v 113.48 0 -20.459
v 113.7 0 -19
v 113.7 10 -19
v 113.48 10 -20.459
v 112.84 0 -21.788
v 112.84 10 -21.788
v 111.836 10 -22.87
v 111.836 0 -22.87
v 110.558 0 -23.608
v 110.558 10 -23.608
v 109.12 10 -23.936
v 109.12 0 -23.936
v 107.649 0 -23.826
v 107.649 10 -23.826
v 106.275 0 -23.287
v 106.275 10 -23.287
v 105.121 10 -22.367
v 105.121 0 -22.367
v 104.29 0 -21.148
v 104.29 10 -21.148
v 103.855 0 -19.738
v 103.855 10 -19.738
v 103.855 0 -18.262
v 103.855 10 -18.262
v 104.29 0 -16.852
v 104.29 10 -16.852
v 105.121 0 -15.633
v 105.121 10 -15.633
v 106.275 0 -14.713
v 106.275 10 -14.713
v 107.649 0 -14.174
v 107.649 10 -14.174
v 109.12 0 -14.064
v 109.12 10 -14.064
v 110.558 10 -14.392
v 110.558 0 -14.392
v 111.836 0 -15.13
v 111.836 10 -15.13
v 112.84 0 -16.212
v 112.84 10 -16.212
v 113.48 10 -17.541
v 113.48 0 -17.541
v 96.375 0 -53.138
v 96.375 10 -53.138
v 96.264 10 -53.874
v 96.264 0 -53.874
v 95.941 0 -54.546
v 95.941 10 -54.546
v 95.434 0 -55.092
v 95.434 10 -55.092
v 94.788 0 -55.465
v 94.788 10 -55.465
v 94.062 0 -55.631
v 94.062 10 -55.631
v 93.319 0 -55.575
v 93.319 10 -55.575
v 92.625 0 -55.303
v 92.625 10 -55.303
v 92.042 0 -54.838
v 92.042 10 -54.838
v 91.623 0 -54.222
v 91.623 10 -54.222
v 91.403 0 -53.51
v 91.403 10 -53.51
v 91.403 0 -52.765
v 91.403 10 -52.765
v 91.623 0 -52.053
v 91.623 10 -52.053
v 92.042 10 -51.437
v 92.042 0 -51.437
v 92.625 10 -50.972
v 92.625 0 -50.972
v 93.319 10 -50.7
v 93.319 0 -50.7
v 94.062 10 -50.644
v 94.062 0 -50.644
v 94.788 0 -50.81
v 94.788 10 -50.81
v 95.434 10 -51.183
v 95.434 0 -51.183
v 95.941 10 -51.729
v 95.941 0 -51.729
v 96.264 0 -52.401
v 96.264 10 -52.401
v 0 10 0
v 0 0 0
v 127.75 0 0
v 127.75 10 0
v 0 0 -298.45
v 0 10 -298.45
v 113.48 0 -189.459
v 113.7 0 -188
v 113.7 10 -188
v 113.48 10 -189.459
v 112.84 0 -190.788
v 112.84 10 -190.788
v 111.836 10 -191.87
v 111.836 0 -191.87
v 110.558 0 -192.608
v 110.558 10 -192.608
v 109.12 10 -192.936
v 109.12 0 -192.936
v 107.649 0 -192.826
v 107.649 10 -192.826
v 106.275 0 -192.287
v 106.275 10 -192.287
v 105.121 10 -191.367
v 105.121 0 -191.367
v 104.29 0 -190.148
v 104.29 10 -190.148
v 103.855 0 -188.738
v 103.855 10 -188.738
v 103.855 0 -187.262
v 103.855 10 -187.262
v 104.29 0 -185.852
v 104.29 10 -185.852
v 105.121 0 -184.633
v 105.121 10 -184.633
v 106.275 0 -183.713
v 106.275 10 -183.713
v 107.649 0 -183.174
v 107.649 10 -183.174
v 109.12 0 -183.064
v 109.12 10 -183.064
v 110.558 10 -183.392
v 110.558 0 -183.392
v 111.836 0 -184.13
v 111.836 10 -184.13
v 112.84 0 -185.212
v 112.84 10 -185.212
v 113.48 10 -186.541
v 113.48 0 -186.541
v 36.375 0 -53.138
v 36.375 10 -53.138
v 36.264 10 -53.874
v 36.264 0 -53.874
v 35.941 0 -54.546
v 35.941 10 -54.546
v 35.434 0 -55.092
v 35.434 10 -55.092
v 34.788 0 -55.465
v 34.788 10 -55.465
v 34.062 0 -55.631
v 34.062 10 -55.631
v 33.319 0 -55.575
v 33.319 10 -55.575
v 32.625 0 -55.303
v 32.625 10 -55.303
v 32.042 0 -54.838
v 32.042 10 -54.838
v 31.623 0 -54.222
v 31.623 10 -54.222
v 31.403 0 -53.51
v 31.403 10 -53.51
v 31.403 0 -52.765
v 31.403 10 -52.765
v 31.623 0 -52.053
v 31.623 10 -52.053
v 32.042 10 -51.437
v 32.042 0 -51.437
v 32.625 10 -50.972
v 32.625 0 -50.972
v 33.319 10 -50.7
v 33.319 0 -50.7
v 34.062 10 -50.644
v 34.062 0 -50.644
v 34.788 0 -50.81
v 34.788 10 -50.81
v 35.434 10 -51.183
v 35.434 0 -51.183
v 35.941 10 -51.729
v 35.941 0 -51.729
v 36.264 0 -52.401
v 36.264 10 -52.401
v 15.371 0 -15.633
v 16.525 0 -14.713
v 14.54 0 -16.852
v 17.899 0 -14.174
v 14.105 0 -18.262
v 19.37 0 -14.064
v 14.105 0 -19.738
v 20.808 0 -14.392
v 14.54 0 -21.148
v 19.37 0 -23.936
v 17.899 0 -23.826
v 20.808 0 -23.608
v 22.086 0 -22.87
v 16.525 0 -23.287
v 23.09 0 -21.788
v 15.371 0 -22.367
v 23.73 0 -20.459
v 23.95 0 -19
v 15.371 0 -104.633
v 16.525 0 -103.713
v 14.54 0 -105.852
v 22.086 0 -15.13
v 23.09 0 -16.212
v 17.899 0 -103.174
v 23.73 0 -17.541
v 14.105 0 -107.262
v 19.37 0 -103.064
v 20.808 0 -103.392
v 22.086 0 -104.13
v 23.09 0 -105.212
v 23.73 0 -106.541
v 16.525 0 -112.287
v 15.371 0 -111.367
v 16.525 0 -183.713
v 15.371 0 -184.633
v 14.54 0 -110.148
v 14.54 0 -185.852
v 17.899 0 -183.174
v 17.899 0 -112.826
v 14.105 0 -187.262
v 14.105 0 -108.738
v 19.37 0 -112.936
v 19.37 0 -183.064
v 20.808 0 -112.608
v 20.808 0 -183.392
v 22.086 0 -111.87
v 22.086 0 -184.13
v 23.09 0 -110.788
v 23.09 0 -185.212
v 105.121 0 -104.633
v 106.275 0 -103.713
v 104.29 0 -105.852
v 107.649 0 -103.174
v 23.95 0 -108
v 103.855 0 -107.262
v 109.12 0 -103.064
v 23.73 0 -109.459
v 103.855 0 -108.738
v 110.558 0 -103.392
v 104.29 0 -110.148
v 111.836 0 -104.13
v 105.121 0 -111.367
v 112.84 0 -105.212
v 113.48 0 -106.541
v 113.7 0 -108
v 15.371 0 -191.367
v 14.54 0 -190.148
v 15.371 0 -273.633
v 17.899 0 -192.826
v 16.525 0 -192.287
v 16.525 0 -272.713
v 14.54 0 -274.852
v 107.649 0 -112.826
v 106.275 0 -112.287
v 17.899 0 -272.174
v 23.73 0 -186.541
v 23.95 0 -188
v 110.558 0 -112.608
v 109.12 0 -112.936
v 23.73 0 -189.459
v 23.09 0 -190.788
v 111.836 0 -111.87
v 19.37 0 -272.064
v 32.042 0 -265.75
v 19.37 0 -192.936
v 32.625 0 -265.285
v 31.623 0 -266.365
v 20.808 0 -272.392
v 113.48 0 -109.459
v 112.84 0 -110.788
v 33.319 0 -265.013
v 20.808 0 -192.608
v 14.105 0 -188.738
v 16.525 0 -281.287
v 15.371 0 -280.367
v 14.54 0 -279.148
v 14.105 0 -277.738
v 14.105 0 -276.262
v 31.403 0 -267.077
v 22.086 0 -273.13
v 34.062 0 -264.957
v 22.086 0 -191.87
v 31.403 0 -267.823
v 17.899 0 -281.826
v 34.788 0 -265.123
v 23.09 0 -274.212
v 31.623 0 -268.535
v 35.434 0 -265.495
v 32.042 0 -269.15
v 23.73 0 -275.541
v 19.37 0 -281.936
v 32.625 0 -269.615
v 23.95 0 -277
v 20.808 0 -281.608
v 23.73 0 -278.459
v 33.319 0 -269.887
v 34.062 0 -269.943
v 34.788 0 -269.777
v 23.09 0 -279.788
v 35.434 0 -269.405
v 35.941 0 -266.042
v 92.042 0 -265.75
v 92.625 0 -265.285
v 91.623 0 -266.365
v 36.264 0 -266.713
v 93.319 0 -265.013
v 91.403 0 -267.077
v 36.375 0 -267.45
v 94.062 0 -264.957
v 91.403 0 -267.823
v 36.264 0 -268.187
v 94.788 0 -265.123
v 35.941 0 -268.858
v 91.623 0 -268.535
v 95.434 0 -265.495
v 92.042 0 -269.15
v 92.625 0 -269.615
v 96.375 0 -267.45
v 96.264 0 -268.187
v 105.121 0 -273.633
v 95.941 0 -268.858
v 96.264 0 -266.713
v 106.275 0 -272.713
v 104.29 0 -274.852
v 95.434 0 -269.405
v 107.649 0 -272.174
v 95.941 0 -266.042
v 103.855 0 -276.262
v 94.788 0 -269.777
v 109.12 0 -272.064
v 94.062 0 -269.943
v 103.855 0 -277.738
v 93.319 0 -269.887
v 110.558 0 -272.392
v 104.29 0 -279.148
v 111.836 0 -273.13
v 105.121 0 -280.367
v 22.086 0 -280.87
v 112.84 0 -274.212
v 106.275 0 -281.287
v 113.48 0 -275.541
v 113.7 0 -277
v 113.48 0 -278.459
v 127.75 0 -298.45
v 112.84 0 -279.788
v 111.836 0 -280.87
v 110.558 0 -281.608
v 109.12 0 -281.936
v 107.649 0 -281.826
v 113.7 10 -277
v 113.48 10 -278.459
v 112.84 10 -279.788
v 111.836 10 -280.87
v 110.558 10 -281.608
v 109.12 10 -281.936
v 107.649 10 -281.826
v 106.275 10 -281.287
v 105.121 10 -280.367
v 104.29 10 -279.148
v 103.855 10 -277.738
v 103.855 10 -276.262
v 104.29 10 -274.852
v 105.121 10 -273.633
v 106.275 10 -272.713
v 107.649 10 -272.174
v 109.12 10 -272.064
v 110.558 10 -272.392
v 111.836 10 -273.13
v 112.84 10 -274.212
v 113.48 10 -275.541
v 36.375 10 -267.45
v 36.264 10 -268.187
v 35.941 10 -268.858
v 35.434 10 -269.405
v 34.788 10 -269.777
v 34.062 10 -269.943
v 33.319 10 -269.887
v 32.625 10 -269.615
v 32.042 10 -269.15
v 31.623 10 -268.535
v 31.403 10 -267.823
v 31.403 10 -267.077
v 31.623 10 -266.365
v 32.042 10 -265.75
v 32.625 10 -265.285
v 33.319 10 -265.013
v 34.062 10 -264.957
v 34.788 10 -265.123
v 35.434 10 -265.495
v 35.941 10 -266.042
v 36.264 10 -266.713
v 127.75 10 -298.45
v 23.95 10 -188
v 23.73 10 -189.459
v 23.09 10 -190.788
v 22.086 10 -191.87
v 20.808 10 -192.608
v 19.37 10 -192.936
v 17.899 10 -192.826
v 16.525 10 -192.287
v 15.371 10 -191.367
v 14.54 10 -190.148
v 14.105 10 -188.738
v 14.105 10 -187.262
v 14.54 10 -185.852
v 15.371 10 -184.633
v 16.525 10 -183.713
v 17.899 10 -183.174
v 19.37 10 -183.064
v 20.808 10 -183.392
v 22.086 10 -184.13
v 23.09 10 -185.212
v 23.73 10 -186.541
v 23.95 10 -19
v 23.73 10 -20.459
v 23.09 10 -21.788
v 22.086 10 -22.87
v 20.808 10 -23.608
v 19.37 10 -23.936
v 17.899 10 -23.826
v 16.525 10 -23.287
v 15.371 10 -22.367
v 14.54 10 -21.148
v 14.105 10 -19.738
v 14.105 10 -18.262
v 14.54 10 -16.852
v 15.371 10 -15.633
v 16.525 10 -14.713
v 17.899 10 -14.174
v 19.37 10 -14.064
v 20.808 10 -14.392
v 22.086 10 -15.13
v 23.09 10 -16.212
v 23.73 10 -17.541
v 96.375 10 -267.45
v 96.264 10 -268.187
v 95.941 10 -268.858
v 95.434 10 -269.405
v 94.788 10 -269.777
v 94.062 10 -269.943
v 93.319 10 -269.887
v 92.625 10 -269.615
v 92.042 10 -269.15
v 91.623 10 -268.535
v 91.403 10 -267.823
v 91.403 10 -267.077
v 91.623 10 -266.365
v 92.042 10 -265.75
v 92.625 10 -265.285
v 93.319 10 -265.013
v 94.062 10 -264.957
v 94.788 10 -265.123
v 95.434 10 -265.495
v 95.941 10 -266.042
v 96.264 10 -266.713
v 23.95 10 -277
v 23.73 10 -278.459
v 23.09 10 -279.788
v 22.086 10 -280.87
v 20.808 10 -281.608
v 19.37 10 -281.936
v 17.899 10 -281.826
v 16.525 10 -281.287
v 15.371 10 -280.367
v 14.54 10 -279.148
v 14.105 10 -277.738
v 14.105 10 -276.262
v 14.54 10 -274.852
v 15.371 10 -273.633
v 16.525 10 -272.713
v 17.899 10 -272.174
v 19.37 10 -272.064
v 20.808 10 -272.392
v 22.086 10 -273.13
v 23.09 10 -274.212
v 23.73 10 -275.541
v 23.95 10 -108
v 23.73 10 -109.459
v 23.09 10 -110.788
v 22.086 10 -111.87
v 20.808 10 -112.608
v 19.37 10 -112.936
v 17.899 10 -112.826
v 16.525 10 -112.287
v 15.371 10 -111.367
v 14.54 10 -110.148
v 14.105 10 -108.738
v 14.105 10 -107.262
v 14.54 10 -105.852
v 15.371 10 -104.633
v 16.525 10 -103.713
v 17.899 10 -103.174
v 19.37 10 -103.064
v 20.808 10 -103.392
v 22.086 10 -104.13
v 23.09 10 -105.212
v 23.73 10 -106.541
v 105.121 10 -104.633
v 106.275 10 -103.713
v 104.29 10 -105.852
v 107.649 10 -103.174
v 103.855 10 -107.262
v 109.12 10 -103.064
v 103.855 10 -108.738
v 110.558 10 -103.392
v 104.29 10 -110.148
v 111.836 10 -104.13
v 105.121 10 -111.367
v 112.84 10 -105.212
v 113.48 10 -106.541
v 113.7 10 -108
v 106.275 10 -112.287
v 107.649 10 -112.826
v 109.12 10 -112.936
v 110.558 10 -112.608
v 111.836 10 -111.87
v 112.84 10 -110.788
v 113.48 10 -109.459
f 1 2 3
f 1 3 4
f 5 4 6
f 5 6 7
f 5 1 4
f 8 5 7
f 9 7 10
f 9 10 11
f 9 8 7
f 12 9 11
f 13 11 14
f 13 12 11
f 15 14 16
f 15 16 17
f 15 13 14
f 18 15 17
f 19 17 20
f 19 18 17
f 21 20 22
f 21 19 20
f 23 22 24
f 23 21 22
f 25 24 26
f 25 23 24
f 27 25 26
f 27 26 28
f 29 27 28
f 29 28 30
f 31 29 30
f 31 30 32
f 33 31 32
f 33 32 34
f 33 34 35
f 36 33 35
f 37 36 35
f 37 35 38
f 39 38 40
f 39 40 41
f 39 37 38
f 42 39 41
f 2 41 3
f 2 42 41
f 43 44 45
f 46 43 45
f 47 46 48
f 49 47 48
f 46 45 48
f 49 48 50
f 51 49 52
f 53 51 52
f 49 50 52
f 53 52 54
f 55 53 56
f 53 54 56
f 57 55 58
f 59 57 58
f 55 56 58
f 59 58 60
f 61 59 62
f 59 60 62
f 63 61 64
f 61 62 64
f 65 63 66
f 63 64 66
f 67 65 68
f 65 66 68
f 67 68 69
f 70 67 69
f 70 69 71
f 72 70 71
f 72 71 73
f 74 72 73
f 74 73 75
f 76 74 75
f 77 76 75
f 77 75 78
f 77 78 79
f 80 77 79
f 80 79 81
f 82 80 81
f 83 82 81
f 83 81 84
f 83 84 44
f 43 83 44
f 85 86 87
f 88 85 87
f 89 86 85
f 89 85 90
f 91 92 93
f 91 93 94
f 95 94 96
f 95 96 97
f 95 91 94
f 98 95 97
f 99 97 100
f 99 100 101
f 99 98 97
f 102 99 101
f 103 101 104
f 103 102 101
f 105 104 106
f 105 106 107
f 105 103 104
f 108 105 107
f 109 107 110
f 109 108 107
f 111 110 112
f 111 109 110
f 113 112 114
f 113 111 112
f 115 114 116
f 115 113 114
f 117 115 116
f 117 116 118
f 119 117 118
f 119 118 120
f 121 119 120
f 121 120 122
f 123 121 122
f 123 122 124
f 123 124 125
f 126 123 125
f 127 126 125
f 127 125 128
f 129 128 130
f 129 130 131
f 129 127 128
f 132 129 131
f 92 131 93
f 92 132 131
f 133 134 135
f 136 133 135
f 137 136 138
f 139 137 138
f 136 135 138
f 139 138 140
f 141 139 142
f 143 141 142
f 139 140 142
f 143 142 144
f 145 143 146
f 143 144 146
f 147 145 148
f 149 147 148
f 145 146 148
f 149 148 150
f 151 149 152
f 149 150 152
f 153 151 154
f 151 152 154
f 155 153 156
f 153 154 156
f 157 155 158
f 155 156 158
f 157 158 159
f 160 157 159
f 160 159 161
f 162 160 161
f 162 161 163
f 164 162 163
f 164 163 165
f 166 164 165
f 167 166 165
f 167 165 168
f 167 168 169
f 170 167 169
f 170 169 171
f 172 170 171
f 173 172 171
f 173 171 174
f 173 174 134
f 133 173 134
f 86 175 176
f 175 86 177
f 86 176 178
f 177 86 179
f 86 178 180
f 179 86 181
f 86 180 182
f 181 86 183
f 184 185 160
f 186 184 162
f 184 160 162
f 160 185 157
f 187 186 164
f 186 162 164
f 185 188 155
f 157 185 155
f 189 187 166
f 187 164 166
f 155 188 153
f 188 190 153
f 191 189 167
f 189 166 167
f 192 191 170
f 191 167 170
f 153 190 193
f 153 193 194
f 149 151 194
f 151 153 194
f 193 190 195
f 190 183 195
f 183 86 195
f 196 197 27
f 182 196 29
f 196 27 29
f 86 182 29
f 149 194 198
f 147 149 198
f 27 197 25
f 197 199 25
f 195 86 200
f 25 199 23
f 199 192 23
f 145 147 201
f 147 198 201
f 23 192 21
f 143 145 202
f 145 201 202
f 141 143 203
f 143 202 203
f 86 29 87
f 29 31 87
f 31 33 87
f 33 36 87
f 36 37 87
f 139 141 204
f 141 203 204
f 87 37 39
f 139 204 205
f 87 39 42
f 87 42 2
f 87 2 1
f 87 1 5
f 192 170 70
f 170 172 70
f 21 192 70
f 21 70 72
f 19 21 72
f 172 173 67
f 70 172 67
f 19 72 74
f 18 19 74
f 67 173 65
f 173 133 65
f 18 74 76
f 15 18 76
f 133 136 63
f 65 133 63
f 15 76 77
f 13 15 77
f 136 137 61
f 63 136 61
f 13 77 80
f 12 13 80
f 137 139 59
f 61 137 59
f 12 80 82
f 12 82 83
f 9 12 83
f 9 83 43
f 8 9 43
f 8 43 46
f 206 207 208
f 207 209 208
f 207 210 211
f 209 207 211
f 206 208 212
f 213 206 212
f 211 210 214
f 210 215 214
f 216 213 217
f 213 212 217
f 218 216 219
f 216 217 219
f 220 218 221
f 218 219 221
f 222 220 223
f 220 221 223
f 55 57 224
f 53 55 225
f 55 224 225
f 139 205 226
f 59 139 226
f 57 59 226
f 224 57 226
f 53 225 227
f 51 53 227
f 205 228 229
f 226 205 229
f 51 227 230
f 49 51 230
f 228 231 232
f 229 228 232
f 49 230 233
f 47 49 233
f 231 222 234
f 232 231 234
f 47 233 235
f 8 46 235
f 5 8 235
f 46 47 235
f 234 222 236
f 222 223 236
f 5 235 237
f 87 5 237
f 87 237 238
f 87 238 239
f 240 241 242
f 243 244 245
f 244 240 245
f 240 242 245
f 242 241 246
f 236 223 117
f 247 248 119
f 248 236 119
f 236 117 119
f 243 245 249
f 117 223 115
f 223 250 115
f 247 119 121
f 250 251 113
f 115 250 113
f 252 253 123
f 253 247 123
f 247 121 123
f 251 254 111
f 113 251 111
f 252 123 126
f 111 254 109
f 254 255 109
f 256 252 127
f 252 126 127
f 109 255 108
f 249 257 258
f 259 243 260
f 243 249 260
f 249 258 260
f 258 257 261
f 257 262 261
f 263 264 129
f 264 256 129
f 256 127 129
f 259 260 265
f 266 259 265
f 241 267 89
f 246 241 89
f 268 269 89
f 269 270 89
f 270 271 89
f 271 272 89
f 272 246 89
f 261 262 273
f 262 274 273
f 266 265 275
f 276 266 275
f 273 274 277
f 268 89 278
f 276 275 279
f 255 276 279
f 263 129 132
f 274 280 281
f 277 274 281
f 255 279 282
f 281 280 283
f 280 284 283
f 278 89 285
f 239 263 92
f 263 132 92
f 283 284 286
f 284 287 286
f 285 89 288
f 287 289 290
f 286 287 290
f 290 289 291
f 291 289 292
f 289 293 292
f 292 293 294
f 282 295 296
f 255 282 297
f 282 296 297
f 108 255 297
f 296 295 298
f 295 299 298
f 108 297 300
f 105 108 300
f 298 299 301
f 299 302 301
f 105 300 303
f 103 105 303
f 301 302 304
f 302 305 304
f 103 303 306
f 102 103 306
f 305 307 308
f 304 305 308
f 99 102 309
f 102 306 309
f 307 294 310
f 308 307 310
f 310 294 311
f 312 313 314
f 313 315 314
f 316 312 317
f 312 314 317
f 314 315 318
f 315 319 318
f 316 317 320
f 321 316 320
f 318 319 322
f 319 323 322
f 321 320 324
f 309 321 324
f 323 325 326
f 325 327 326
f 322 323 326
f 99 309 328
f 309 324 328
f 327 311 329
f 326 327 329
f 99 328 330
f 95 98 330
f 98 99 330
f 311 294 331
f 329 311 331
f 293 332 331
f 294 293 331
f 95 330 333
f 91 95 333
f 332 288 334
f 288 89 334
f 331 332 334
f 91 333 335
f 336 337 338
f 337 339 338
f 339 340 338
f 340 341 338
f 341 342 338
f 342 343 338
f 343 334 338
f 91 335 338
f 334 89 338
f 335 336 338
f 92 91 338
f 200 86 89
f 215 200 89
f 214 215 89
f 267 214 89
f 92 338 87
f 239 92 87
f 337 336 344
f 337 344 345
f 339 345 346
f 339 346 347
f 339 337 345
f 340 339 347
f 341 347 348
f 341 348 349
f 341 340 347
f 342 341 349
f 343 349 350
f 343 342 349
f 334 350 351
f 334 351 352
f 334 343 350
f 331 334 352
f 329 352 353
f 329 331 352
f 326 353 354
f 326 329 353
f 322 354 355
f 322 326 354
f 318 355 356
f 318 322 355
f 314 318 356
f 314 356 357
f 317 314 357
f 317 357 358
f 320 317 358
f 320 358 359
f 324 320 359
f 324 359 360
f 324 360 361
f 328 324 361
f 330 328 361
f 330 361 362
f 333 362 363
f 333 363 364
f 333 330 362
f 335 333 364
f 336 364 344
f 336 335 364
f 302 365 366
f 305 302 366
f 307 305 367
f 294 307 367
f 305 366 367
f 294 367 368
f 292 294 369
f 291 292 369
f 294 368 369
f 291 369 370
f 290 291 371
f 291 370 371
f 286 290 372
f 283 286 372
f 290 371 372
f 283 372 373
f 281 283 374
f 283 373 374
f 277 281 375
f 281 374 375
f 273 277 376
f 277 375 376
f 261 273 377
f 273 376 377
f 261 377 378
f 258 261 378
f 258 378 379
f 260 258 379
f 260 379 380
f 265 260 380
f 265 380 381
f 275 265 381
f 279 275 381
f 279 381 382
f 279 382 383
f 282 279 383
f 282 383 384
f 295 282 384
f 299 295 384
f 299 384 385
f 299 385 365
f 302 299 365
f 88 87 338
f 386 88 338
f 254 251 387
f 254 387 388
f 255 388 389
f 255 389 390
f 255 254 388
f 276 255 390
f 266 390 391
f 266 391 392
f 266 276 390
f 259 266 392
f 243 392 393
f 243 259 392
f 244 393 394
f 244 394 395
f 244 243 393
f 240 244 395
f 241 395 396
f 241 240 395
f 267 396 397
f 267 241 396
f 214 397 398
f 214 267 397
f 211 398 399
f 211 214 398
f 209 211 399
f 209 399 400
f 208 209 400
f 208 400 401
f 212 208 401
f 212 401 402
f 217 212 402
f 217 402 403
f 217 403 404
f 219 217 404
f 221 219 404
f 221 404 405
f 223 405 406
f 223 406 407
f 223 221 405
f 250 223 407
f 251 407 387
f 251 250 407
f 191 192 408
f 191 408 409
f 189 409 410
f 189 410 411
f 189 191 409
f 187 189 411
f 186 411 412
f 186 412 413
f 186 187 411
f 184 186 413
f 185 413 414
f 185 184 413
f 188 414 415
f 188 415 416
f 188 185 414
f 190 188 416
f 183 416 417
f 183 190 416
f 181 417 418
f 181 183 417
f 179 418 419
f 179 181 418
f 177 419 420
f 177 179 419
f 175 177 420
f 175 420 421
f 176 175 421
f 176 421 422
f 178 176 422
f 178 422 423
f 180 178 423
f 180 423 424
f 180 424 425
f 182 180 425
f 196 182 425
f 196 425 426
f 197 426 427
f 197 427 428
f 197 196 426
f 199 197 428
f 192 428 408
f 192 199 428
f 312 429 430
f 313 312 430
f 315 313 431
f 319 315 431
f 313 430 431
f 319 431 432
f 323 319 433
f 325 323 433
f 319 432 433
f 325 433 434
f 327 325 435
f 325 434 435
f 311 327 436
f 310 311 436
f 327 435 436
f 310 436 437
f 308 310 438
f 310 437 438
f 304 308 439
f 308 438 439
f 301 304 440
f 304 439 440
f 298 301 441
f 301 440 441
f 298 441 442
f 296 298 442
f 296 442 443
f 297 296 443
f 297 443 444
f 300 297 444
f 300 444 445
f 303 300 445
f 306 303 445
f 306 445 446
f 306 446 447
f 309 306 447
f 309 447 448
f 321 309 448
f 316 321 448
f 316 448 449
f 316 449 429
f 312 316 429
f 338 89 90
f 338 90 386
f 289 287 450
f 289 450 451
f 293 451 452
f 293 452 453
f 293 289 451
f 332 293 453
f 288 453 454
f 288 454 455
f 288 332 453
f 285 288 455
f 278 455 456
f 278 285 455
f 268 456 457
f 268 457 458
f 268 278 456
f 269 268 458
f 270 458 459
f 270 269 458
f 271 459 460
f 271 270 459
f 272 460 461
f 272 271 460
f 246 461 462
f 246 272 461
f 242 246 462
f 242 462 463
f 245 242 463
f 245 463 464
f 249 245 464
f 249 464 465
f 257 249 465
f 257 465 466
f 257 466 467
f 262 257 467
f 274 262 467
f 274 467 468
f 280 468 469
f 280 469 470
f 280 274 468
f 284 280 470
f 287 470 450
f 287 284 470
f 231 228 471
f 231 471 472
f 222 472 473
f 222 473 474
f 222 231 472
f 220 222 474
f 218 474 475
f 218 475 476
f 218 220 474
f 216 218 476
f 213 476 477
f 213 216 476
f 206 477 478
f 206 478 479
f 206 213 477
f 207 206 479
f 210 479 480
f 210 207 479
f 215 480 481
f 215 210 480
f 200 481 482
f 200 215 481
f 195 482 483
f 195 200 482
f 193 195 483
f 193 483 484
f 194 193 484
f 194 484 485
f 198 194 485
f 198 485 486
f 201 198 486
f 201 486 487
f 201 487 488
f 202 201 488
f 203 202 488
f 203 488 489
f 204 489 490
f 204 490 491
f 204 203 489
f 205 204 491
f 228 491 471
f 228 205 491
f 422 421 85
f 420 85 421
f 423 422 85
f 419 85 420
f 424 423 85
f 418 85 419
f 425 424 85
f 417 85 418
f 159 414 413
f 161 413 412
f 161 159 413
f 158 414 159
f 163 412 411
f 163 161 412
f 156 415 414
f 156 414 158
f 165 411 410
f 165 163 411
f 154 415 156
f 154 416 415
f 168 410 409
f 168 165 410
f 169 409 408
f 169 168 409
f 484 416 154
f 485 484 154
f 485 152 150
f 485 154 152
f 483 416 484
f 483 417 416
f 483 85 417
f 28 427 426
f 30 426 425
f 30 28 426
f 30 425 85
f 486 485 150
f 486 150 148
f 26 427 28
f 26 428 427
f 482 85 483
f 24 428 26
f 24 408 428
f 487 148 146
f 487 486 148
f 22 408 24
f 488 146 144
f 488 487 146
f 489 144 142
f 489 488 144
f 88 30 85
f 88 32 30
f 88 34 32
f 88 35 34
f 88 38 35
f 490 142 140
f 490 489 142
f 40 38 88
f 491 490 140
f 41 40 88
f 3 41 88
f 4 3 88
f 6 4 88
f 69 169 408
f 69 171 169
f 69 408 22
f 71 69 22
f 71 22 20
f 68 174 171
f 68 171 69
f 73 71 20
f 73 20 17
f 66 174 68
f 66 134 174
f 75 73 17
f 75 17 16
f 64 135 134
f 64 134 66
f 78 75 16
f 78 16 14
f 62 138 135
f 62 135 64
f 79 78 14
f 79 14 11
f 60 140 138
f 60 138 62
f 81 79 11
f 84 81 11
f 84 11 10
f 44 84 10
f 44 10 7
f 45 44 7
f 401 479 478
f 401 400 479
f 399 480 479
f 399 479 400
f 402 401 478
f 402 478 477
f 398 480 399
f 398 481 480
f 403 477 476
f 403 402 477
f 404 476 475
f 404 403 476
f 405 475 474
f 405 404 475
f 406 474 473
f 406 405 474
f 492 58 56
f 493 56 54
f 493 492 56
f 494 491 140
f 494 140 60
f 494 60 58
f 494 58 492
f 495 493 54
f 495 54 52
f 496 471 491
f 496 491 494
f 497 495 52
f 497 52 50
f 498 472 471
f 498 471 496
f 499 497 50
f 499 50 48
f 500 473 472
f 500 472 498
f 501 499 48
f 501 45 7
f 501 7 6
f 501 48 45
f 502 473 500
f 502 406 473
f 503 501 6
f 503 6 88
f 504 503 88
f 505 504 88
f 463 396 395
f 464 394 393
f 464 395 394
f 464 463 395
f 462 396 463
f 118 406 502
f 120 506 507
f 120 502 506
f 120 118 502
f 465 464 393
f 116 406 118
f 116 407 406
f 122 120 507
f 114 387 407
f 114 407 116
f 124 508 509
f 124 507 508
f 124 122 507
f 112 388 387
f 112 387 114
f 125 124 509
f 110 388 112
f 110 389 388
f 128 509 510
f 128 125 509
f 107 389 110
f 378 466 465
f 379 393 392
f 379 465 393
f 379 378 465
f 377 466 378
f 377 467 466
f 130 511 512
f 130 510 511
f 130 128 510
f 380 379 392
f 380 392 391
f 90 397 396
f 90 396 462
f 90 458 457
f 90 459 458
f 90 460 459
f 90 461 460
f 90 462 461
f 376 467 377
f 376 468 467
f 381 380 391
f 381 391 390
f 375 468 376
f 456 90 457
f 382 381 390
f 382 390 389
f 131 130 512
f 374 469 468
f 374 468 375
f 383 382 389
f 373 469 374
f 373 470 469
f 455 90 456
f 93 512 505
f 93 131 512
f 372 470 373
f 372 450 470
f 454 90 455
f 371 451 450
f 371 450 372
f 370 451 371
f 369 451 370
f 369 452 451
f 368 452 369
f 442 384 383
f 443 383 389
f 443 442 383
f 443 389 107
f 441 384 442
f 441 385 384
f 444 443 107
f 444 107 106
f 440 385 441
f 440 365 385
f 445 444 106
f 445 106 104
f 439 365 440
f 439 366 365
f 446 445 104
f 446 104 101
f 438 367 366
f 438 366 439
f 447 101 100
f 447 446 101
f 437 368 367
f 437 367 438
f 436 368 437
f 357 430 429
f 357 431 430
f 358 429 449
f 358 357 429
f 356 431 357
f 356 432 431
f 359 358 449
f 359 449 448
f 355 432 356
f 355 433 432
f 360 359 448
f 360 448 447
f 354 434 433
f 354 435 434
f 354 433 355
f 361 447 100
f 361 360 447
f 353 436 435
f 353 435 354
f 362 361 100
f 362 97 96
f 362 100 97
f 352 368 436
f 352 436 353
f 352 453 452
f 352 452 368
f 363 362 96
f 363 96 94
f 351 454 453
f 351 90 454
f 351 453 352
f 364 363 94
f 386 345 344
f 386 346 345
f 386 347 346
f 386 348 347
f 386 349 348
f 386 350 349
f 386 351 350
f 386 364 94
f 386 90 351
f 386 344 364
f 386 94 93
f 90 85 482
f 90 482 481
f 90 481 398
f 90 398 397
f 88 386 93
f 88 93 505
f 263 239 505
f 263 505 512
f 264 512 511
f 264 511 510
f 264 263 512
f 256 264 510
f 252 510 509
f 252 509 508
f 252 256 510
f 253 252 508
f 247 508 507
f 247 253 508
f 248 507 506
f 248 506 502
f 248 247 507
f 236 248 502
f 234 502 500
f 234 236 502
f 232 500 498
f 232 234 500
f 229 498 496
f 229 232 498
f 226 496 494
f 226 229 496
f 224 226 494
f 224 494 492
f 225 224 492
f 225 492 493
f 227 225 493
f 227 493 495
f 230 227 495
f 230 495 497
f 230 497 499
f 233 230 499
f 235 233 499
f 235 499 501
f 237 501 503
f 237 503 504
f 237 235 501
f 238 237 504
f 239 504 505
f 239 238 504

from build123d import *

# Parameters (mm, degrees)
SKETCH1_W           = 127.75
SKETCH1_H           = 298.45
SKETCH1_R           = 4.95
BOSS_EXTRUDE1_DEPTH = 10
SKETCH4_R           = 2.5
CUT_EXTRUDE2_DEPTH  = 11


with BuildPart() as part:
    # Sketch1 → Boss-Extrude1 (new body)
    with BuildSketch(Plane(origin=(0, 0, 0), x_dir=(1, 0, 0), z_dir=(0, 1, 0))):
        with Locations((63.875, 149.225)):
            Rectangle(SKETCH1_W, SKETCH1_H)
        with Locations((19, 277)):
            Circle(SKETCH1_R, mode=Mode.SUBTRACT)
        with Locations((108.75, 277)):
            Circle(SKETCH1_R, mode=Mode.SUBTRACT)
        with Locations((108.75, 19)):
            Circle(SKETCH1_R, mode=Mode.SUBTRACT)
        with Locations((19, 19)):
            Circle(SKETCH1_R, mode=Mode.SUBTRACT)
        with Locations((19, 108)):
            Circle(SKETCH1_R, mode=Mode.SUBTRACT)
        with Locations((108.75, 108)):
            Circle(SKETCH1_R, mode=Mode.SUBTRACT)
        with Locations((19, 188)):
            Circle(SKETCH1_R, mode=Mode.SUBTRACT)
        with Locations((108.75, 188)):
            Circle(SKETCH1_R, mode=Mode.SUBTRACT)
    extrude(amount=BOSS_EXTRUDE1_DEPTH)

    # Sketch4 → Cut-Extrude2 (cut, through all)
    with BuildSketch(Plane(origin=(0, 10, 0), x_dir=(1, 0, 0), z_dir=(0, 1, 0))):
        with Locations((93.875, 267.45)):
            Circle(SKETCH4_R)
        with Locations((33.875, 267.45)):
            Circle(SKETCH4_R)
        with Locations((93.875, 53.1375)):
            Circle(SKETCH4_R)
        with Locations((33.875, 53.1375)):
            Circle(SKETCH4_R)
    extrude(amount=-CUT_EXTRUDE2_DEPTH, mode=Mode.SUBTRACT)


solid = part.part
